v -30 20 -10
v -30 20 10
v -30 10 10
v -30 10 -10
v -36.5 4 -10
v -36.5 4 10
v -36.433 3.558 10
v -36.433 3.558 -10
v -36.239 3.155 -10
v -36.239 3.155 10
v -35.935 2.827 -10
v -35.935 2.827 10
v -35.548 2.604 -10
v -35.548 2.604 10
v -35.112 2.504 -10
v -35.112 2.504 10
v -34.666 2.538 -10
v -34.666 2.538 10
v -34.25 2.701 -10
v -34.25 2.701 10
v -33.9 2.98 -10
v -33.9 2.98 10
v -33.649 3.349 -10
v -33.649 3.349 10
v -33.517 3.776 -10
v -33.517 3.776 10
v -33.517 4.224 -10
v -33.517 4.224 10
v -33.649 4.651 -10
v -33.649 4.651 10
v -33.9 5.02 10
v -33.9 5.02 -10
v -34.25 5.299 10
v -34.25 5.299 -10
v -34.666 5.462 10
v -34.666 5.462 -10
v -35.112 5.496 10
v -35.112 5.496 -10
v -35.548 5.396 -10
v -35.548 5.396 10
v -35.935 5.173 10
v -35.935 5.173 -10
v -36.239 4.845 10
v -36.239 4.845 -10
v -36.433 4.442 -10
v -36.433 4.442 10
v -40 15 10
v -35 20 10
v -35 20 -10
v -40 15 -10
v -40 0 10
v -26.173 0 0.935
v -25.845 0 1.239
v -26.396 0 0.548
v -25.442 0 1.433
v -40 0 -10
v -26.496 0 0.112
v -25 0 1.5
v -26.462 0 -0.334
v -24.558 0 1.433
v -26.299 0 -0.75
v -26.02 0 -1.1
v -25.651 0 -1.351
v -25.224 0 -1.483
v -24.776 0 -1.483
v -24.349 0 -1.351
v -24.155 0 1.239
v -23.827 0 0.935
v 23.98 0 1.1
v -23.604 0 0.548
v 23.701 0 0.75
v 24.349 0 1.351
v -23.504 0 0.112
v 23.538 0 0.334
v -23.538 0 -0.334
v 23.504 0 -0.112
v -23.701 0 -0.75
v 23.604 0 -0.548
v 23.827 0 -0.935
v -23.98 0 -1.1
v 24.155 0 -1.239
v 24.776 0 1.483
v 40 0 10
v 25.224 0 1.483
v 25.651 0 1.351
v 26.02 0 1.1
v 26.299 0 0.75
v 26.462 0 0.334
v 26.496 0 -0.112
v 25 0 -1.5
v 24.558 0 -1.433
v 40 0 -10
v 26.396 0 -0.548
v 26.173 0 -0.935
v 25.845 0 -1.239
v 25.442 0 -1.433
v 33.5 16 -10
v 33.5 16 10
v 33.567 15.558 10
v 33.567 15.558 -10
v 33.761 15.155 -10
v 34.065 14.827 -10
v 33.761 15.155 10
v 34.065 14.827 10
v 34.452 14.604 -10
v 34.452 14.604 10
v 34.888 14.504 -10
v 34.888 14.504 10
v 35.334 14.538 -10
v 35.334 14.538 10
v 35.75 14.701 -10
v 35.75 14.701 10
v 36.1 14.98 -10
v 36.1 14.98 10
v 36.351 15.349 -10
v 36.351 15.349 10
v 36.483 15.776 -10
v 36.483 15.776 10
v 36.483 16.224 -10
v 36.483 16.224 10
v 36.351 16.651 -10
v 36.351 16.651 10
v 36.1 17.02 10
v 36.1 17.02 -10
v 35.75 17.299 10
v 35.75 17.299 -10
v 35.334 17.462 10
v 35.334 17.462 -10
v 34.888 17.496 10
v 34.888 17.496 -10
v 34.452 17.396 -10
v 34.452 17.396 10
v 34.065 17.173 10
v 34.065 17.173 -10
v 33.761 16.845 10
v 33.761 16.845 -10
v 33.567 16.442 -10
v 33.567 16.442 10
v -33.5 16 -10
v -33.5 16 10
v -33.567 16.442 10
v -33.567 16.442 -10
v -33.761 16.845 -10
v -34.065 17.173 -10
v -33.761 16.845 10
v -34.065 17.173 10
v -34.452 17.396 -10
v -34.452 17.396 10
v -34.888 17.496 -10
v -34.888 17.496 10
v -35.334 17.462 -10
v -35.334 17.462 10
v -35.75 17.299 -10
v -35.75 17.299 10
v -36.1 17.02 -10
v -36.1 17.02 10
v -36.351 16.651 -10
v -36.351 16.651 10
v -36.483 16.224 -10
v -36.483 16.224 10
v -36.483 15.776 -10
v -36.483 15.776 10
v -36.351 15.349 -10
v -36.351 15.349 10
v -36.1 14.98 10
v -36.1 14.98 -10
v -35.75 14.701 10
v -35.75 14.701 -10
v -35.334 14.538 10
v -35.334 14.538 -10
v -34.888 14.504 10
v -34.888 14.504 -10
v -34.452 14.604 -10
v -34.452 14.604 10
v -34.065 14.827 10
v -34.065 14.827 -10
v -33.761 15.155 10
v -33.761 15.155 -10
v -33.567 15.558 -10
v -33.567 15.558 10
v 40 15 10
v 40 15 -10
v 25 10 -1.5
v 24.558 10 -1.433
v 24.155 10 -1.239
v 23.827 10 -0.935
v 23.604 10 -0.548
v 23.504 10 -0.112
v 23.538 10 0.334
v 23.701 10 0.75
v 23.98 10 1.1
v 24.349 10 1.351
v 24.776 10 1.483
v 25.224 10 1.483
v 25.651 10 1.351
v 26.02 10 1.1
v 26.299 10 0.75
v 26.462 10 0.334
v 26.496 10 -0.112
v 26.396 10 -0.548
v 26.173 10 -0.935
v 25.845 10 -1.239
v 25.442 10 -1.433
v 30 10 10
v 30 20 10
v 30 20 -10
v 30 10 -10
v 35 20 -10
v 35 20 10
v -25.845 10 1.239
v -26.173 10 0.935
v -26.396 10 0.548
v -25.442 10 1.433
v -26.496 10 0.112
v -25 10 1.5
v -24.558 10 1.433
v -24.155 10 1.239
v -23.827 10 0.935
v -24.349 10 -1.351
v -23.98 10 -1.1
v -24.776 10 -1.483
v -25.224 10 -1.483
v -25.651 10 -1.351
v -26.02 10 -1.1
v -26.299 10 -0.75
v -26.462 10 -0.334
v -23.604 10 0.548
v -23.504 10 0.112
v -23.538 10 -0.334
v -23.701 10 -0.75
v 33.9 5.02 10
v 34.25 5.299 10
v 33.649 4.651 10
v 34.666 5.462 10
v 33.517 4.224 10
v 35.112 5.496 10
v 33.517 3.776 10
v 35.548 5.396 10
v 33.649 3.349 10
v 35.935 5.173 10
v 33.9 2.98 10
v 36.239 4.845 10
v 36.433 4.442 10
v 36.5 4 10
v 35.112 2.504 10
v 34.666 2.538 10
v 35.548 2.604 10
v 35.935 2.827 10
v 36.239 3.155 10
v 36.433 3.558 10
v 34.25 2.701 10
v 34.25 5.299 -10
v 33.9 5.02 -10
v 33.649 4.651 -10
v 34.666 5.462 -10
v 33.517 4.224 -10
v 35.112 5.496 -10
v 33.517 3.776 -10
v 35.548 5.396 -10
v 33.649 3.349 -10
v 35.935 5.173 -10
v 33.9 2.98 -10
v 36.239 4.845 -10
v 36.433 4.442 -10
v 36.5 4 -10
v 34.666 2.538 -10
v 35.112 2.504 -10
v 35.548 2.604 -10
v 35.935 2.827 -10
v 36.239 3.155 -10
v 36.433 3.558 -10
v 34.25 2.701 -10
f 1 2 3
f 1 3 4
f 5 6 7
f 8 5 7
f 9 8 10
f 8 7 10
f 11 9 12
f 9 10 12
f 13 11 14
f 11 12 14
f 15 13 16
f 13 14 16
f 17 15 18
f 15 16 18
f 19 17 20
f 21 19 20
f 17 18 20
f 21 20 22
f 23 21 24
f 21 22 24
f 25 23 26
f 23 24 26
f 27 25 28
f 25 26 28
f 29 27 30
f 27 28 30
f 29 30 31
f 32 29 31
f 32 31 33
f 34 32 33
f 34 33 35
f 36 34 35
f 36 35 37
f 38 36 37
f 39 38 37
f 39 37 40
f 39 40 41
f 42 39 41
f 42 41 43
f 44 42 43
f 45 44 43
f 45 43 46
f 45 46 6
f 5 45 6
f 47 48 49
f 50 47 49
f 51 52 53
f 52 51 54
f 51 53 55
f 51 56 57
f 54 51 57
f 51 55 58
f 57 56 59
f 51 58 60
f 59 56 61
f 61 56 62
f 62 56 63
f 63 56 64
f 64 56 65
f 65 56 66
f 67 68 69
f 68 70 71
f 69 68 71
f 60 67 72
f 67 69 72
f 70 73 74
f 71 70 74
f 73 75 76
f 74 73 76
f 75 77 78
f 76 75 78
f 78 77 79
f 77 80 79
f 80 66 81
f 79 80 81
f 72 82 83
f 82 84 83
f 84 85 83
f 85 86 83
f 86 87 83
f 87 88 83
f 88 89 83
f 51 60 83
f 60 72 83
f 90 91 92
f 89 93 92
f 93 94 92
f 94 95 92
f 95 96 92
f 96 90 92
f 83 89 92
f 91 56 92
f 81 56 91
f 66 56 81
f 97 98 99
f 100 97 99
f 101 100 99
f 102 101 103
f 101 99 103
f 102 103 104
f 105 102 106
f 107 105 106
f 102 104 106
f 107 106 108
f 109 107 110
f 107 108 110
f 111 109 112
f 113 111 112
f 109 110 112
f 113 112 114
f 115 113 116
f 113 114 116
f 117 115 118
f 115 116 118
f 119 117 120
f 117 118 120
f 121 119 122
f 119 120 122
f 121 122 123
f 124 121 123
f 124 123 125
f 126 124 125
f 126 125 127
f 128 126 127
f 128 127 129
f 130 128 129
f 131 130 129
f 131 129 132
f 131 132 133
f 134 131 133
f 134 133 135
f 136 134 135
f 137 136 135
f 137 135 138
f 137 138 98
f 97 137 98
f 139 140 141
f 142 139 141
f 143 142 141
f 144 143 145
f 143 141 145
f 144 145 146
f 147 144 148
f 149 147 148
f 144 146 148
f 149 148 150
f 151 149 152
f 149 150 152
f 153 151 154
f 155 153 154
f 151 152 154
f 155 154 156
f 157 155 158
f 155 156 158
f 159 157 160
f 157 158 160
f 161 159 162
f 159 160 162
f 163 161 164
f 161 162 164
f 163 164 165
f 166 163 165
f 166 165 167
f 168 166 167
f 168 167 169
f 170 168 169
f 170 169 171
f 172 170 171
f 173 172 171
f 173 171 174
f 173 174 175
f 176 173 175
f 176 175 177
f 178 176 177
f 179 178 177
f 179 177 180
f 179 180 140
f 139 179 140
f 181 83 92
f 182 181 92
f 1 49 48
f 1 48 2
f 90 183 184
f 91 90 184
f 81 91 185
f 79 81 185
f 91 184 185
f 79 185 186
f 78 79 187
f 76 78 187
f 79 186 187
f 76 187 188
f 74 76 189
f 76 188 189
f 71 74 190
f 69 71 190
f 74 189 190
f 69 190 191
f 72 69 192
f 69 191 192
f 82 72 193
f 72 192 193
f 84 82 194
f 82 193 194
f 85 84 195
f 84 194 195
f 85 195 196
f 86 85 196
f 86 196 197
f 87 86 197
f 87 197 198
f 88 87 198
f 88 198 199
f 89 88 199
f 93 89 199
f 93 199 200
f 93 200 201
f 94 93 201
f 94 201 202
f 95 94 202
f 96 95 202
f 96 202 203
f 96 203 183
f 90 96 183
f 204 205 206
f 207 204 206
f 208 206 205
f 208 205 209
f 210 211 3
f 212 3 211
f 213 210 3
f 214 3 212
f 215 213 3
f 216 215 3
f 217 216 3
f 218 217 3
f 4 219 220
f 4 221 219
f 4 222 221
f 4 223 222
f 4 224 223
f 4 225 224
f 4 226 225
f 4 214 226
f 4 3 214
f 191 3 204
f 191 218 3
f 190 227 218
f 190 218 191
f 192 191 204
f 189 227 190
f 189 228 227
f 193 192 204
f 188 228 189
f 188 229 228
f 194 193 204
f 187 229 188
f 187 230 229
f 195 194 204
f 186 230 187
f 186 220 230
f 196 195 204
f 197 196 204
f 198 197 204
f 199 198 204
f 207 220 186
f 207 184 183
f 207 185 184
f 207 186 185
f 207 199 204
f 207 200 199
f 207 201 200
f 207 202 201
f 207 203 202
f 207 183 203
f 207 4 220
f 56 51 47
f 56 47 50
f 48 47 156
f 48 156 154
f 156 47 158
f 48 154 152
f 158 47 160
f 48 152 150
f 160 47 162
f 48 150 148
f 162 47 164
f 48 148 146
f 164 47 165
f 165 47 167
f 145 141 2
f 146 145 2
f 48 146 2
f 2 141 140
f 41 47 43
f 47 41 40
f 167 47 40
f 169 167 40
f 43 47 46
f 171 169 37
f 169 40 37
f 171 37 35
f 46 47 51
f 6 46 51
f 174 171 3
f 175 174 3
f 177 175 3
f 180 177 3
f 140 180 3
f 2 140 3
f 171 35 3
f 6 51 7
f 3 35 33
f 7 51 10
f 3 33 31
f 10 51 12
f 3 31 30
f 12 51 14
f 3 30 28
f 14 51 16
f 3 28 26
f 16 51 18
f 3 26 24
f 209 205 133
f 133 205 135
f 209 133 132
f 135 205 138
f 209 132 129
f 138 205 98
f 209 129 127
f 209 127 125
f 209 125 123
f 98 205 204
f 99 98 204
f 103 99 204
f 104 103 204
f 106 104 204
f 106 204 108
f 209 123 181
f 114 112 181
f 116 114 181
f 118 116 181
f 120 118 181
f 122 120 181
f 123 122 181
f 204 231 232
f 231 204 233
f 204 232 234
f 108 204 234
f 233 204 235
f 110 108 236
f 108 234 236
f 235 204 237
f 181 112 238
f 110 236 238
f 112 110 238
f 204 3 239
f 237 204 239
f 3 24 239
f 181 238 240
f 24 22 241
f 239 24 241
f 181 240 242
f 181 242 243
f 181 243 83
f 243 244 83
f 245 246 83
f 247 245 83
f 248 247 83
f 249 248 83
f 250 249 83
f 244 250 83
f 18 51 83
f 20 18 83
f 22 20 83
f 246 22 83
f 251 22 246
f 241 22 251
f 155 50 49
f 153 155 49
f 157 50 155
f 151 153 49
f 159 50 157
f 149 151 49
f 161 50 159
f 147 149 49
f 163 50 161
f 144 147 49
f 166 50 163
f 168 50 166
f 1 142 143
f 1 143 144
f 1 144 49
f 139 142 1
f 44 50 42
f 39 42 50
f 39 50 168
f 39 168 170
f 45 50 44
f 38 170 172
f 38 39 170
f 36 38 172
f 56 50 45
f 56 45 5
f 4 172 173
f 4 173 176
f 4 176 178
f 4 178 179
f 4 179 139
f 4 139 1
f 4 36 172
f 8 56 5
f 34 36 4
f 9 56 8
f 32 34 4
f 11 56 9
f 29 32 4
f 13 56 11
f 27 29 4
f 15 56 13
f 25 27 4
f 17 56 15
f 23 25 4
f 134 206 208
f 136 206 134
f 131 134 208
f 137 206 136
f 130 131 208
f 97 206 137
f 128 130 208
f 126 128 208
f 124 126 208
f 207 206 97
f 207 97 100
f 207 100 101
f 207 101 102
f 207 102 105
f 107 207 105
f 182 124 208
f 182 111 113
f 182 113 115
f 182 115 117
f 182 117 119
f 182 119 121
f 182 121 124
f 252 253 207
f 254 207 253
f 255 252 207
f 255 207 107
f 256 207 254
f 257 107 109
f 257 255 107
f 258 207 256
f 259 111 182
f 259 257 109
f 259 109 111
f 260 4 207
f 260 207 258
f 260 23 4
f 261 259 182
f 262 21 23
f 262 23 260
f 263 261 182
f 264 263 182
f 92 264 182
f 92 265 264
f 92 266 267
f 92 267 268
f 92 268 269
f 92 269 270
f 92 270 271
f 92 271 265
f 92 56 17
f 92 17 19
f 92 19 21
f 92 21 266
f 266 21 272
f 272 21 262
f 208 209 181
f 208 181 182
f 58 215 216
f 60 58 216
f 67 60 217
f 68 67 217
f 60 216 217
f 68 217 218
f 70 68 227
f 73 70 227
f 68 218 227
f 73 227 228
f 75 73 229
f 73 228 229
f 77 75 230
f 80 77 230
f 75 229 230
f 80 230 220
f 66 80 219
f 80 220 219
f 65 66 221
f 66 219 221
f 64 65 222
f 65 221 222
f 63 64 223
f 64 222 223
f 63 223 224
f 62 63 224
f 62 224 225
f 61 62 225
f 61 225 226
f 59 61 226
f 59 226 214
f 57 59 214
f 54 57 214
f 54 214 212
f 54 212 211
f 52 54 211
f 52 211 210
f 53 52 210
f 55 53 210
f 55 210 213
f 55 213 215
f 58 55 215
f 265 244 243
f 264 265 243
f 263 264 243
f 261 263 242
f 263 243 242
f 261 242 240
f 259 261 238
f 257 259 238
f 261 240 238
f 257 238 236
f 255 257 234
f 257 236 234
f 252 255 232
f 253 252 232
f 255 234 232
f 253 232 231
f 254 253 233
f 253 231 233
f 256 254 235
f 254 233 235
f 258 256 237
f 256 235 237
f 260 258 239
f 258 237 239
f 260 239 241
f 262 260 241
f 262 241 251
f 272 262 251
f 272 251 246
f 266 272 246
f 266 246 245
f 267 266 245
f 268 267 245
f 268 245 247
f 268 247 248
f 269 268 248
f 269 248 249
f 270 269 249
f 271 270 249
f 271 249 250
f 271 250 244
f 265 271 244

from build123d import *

# Parameters (mm, degrees)
SKETCH_1_W          = 80
SKETCH_1_H          = 20
EXTRUDE_1_DEPTH     = 20
SKETCH_2_W          = 60
SKETCH_2_H          = 20
CUT_EXTRUDE_1_DEPTH = 10
SKETCH_3_R          = 1.5
CUT_EXTRUDE_2_DEPTH = 43.426406871
CHAMFER_1_SIZE      = 5
SKETCH_4_R          = 1.5
CUT_EXTRUDE_3_DEPTH = 49.989794856


with BuildPart() as part:
    # 草图1 → 凸台-拉伸1 (new body)
    with BuildSketch(Plane(origin=(0, 0, 0), x_dir=(1, 0, 0), z_dir=(0, 1, 0))):
        Rectangle(SKETCH_1_W, SKETCH_1_H)
    extrude(amount=EXTRUDE_1_DEPTH)

    # 草图2 → 切除-拉伸1 (cut)
    with BuildSketch(Plane(origin=(0, 20, 0), x_dir=(1, 0, 0), z_dir=(0, 1, 0))):
        Rectangle(SKETCH_2_W, SKETCH_2_H)
    extrude(amount=-CUT_EXTRUDE_1_DEPTH, mode=Mode.SUBTRACT)

    # 草图3 → 切除-拉伸2 (cut, through all)
    with BuildSketch(Plane(origin=(0, 10, 0), x_dir=(1, 0, 0), z_dir=(0, 1, 0))):
        with Locations(Location((-25, 0, 0), (0, 0, 270))):
            Circle(SKETCH_3_R)
        with Locations(Location((25, 0, 0), (0, 0, 90))):
            Circle(SKETCH_3_R)
    extrude(amount=-CUT_EXTRUDE_2_DEPTH, mode=Mode.SUBTRACT)

    # 倒角1
    chamfer_1_edges = [part.edges().sort_by_distance(p)[0] for p in [
        (-40, 20, 0),
        (40, 20, 0),
    ]]
    chamfer(chamfer_1_edges, length=CHAMFER_1_SIZE)

    # 草图4 → 切除-拉伸3 (cut, through all)
    with BuildSketch(Plane.XY.offset(10)):
        with Locations((-35, 16)):
            Circle(SKETCH_4_R)
        with Locations(Location((-35, 4, 0), (0, 0, 180))):
            Circle(SKETCH_4_R)
        with Locations((35, 4)):
            Circle(SKETCH_4_R)
        with Locations(Location((35, 16, 0), (0, 0, 180))):
            Circle(SKETCH_4_R)
    extrude(amount=-CUT_EXTRUDE_3_DEPTH, mode=Mode.SUBTRACT)


solid = part.part
